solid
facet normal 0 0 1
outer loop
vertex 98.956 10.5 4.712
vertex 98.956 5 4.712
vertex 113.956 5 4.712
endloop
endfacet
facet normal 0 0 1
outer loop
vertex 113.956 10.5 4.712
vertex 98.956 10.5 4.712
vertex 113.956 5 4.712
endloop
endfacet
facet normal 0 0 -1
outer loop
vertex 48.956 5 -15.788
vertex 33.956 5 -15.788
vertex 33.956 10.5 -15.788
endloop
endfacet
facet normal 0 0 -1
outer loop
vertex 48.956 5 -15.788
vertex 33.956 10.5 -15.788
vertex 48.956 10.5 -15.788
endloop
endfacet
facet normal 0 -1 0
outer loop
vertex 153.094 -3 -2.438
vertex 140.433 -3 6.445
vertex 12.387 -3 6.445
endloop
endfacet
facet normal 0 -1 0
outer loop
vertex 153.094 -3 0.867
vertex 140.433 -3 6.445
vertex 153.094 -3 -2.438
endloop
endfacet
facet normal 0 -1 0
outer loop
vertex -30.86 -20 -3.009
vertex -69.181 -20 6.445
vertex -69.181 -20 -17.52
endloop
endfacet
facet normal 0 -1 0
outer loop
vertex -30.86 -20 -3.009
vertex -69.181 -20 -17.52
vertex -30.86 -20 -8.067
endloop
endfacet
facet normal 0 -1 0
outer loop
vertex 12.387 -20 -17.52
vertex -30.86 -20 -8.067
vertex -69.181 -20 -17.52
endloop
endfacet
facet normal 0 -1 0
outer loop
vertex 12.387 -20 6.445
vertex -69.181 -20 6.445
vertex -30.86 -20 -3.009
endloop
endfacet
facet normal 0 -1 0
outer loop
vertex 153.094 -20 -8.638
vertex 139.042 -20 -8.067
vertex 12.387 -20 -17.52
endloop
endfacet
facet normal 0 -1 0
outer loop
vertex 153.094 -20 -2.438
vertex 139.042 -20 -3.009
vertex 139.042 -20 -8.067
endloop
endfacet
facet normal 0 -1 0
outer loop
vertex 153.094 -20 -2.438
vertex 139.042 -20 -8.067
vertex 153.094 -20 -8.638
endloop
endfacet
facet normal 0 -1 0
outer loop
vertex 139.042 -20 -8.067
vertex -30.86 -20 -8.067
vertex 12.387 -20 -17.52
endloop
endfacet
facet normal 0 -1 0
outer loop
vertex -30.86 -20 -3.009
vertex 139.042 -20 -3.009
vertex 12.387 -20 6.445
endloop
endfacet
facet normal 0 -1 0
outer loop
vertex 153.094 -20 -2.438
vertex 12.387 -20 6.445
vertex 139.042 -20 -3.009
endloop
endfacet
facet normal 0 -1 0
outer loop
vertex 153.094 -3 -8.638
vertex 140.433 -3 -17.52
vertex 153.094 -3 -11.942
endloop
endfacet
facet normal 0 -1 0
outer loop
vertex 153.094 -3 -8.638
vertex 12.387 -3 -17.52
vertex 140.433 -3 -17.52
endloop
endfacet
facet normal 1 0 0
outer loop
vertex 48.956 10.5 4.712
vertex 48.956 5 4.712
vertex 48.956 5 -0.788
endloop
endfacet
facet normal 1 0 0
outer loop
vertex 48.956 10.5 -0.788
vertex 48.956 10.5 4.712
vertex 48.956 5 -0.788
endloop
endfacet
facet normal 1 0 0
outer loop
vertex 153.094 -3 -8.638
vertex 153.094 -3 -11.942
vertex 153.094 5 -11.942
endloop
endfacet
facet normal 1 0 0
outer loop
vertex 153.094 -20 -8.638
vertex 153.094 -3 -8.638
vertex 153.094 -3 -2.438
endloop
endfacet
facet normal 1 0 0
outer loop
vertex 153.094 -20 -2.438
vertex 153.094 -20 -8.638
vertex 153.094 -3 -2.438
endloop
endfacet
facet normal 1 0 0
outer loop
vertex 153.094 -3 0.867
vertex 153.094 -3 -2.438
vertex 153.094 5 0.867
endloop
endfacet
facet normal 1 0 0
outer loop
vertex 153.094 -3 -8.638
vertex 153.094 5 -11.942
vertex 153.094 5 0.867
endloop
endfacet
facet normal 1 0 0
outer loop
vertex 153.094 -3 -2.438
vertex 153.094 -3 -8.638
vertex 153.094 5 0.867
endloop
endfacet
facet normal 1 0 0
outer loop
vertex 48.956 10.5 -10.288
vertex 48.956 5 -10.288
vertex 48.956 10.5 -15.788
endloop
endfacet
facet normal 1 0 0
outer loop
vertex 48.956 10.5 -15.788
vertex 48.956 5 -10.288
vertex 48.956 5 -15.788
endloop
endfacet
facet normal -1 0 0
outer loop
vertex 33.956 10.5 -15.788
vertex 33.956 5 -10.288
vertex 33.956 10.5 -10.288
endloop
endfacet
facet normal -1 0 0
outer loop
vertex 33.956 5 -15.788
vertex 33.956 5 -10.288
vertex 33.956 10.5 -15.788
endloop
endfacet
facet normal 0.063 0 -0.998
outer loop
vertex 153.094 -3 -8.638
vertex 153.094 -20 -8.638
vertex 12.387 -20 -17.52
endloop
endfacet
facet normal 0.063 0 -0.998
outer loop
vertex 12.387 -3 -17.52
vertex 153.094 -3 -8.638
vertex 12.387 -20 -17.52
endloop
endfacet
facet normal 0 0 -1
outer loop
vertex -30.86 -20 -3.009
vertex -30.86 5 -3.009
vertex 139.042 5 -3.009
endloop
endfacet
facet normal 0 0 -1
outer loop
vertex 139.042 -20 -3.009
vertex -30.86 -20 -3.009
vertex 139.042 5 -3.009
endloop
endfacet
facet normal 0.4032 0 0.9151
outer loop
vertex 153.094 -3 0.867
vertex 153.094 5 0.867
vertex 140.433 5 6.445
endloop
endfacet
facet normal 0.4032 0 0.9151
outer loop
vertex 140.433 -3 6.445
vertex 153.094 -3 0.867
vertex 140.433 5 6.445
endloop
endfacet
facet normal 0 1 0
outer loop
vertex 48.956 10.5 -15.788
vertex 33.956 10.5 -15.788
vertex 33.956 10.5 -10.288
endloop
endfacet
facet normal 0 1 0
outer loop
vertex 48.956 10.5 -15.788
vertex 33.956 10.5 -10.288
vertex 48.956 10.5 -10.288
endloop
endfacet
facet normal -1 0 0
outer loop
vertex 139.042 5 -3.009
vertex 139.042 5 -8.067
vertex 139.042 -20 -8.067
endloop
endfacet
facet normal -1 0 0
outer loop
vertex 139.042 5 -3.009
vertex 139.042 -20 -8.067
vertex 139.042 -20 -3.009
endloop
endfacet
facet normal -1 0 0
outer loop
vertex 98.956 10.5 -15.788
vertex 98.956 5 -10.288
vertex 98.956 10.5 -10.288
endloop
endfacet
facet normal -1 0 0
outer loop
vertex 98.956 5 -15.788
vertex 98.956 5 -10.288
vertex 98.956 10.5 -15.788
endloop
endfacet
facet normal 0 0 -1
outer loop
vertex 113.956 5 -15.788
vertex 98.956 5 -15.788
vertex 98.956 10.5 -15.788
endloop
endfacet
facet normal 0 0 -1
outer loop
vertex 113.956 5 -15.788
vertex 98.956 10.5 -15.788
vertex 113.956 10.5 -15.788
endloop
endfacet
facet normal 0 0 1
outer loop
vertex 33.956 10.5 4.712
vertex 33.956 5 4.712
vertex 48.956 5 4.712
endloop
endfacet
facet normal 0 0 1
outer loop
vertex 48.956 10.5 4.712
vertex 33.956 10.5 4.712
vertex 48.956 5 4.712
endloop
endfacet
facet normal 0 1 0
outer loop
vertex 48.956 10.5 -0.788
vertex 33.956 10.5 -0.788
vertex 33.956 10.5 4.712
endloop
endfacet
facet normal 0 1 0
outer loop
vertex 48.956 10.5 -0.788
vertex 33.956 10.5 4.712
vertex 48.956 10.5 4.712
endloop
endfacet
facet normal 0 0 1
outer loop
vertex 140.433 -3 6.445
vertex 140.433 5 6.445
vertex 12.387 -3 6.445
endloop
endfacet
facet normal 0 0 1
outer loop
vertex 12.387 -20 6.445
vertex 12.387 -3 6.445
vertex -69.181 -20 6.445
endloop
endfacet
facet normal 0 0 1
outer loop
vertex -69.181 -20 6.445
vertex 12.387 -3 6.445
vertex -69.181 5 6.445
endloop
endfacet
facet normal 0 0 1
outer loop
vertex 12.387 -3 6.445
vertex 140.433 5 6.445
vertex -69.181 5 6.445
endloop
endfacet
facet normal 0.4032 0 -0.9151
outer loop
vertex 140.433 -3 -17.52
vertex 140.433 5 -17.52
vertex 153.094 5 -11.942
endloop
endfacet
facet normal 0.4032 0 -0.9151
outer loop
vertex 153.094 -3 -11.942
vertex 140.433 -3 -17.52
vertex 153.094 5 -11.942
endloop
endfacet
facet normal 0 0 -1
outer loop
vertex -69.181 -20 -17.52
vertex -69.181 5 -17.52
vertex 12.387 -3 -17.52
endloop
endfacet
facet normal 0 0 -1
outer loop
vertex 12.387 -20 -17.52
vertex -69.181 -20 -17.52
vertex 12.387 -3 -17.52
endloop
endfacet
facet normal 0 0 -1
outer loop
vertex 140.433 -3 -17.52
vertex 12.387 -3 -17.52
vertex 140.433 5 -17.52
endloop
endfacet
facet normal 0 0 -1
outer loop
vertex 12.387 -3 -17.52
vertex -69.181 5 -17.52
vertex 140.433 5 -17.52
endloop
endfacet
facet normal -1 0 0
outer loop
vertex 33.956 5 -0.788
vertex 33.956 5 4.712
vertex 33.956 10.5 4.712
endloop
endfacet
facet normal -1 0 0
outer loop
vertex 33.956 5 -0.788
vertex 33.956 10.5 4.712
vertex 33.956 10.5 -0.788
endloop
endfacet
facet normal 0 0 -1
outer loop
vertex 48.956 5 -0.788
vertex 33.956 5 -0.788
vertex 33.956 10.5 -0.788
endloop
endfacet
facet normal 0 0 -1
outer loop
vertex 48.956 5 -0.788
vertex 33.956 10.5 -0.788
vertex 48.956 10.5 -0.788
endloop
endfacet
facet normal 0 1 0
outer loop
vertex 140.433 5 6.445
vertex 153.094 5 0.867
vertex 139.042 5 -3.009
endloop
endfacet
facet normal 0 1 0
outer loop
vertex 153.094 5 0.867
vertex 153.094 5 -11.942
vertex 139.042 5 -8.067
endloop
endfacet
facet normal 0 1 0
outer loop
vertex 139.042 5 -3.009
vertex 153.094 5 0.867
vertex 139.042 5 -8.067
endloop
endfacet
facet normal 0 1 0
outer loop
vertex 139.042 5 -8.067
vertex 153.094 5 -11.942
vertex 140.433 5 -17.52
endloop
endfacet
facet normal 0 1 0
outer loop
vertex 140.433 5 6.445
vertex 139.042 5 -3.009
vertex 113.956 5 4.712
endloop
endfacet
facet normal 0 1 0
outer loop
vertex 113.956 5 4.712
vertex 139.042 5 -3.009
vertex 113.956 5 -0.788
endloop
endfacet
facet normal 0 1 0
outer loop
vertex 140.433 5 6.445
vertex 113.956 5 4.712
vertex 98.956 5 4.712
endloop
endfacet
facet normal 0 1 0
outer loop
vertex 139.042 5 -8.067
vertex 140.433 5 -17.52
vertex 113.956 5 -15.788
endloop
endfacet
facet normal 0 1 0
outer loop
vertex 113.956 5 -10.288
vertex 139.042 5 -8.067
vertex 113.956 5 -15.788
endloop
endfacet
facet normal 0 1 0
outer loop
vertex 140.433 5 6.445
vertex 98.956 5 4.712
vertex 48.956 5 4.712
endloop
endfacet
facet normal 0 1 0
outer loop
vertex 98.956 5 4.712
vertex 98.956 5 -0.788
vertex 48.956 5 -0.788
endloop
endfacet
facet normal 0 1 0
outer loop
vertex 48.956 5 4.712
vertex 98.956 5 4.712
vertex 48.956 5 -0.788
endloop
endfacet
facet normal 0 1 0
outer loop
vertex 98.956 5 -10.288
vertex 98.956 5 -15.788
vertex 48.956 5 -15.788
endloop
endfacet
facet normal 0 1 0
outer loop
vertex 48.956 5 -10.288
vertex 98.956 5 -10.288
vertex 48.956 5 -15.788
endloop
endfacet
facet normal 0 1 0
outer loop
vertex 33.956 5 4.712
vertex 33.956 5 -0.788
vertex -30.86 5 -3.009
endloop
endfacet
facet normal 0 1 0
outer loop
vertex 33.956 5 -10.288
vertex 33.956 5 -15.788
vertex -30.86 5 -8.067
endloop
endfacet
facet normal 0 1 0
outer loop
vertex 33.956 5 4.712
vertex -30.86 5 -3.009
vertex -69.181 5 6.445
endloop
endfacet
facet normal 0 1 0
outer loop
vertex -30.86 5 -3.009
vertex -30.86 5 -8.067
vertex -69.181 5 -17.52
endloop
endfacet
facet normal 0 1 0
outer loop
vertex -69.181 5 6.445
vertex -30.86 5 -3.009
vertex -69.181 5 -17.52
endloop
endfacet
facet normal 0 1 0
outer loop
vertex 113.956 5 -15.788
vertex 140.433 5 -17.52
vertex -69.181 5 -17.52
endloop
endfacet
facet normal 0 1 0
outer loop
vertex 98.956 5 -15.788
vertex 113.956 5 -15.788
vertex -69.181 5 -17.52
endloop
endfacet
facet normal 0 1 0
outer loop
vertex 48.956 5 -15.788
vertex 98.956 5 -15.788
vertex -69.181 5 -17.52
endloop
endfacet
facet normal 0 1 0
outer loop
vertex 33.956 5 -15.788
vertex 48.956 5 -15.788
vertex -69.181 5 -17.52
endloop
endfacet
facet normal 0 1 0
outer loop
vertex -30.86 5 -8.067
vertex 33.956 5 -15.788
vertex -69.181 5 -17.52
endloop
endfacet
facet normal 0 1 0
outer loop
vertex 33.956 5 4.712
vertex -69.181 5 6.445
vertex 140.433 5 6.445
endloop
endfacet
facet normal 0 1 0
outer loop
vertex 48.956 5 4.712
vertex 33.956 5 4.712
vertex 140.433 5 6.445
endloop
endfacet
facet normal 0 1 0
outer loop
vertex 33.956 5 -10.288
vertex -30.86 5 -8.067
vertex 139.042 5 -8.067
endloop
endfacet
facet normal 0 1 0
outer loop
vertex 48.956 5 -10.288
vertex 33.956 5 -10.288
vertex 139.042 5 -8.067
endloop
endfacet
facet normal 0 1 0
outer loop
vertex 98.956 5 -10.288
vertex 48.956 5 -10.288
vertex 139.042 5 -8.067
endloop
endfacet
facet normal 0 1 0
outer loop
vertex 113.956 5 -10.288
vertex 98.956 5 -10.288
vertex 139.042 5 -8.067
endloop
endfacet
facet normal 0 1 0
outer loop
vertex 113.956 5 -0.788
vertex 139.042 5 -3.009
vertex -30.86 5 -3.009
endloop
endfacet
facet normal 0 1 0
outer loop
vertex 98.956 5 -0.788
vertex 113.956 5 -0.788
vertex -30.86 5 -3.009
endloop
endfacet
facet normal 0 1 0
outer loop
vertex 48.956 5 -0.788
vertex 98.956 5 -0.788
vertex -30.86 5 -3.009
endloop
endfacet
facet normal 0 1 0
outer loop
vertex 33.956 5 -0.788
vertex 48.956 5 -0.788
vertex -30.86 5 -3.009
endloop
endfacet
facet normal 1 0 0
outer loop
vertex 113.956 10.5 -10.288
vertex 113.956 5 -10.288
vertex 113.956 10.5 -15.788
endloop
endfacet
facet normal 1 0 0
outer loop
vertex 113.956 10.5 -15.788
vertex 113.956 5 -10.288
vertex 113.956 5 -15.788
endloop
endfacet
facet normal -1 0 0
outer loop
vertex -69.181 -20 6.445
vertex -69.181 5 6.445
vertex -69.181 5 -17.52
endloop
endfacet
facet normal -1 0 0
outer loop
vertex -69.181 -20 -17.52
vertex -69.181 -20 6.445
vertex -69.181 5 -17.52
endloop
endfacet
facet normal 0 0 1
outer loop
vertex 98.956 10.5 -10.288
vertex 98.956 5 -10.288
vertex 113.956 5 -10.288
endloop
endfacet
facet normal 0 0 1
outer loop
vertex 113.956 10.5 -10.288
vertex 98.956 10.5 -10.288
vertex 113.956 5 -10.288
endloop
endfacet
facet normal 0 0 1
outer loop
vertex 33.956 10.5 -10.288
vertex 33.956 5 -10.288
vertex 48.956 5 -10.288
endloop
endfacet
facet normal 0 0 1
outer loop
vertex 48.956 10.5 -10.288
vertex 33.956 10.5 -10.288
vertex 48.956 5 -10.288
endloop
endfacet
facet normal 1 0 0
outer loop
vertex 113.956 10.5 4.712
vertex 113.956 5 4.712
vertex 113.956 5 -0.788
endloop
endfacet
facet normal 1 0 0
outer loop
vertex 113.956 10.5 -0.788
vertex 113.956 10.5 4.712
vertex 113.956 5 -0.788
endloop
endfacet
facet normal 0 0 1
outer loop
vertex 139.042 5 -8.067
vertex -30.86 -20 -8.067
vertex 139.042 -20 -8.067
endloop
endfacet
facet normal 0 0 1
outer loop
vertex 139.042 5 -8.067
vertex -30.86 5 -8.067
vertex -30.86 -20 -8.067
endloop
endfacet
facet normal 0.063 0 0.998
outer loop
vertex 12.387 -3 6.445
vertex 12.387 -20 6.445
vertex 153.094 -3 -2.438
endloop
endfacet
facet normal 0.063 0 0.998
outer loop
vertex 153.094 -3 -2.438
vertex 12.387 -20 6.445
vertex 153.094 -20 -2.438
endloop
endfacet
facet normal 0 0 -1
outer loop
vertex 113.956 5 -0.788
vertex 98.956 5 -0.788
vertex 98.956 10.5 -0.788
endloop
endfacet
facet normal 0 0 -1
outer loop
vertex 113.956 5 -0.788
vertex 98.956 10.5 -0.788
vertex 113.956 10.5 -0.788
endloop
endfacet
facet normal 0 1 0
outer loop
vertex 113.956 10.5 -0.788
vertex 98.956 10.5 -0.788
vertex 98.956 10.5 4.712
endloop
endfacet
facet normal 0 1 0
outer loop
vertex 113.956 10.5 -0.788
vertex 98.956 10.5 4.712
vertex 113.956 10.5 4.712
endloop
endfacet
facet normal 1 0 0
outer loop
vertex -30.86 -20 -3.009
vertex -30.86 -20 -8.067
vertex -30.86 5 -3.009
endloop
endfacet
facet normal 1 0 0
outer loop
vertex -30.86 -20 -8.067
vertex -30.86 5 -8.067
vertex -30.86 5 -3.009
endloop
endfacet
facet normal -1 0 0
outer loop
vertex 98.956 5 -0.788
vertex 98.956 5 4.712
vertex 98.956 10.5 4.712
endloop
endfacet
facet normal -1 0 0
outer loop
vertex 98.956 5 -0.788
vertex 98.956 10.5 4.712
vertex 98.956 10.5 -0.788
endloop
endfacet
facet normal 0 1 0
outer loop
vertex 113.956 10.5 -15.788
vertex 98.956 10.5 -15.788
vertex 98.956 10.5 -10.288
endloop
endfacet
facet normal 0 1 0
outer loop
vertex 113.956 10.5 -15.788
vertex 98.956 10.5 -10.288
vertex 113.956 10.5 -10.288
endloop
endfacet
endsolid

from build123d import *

# Parameters (mm, degrees)
BOSS_EXTRUDE1_DEPTH = 5
SKETCH2_W           = 169.901358226
SKETCH2_H           = 5.057880692
CUT_EXTRUDE1_DEPTH  = 26
SKETCH3_W           = 15
SKETCH3_H           = 5.5
BOSS_EXTRUDE2_DEPTH = 5.5
SKETCH4_W           = 169.901358226
SKETCH4_H           = 5.057880692
BOSS_EXTRUDE3_DEPTH = 20
CUT_EXTRUDE5_DEPTH  = 17


with BuildPart() as part:
    # Sketch1 → Boss-Extrude1 (new body)
    with BuildSketch(Plane(origin=(0, 0, 0), x_dir=(1, 0, 0), z_dir=(0, 1, 0))):
        Polygon((-69.180780697, 17.519952768), (140.433207055, 17.519952768), (153.094163244, 11.942432967), (153.094163244, -0.867190791), (140.433207055, -6.444710592), (-69.180780697, -6.444710592), align=None)
    extrude(amount=BOSS_EXTRUDE1_DEPTH)

    # Sketch2 → Cut-Extrude1 (cut)
    with BuildSketch(Plane.XZ):
        with Locations((54.091074894, -5.537621088)):
            Rectangle(SKETCH2_W, SKETCH2_H)
    extrude(amount=-CUT_EXTRUDE1_DEPTH, mode=Mode.SUBTRACT)

    # Sketch3 → Boss-Extrude2 (add)
    with BuildSketch(Plane(origin=(0, 5, 0), x_dir=(1, 0, 0), z_dir=(0, 1, 0))):
        with Locations((106.456138521, 13.037621088)):
            Rectangle(SKETCH3_W, SKETCH3_H)
        with Locations((106.456138521, -1.962378912)):
            Rectangle(SKETCH3_W, SKETCH3_H)
        with Locations((41.456138521, -1.962378912)):
            Rectangle(SKETCH3_W, SKETCH3_H)
        with Locations((41.456138521, 13.037621088)):
            Rectangle(SKETCH3_W, SKETCH3_H)
    extrude(amount=BOSS_EXTRUDE2_DEPTH)

    # Sketch4 → Boss-Extrude3 (add)
    with BuildSketch(Plane.XZ):
        Polygon((-69.180780697, 6.444710592), (-69.180780697, -17.519952768), (140.433207055, -17.519952768), (153.094163244, -11.942432967), (153.094163244, 0.867190791), (140.433207055, 6.444710592), align=None)
        with Locations((54.091074894, -5.537621088)):
            Rectangle(SKETCH4_W, SKETCH4_H, mode=Mode.SUBTRACT)
    extrude(amount=BOSS_EXTRUDE3_DEPTH)

    # Sketch7 → Cut-Extrude5 (cut)
    with BuildSketch(Plane.XZ.offset(20)):
        Polygon((12.387057353, -17.519952768), (140.433207055, -17.519952768), (153.094163244, -11.942432967), (153.094163244, -8.637621088), align=None)
        Polygon((153.094163244, -2.437621088), (153.094163244, 0.867190791), (140.433207055, 6.444710592), (12.387057353, 6.444710592), align=None)
    extrude(amount=-CUT_EXTRUDE5_DEPTH, mode=Mode.SUBTRACT)


solid = part.part
